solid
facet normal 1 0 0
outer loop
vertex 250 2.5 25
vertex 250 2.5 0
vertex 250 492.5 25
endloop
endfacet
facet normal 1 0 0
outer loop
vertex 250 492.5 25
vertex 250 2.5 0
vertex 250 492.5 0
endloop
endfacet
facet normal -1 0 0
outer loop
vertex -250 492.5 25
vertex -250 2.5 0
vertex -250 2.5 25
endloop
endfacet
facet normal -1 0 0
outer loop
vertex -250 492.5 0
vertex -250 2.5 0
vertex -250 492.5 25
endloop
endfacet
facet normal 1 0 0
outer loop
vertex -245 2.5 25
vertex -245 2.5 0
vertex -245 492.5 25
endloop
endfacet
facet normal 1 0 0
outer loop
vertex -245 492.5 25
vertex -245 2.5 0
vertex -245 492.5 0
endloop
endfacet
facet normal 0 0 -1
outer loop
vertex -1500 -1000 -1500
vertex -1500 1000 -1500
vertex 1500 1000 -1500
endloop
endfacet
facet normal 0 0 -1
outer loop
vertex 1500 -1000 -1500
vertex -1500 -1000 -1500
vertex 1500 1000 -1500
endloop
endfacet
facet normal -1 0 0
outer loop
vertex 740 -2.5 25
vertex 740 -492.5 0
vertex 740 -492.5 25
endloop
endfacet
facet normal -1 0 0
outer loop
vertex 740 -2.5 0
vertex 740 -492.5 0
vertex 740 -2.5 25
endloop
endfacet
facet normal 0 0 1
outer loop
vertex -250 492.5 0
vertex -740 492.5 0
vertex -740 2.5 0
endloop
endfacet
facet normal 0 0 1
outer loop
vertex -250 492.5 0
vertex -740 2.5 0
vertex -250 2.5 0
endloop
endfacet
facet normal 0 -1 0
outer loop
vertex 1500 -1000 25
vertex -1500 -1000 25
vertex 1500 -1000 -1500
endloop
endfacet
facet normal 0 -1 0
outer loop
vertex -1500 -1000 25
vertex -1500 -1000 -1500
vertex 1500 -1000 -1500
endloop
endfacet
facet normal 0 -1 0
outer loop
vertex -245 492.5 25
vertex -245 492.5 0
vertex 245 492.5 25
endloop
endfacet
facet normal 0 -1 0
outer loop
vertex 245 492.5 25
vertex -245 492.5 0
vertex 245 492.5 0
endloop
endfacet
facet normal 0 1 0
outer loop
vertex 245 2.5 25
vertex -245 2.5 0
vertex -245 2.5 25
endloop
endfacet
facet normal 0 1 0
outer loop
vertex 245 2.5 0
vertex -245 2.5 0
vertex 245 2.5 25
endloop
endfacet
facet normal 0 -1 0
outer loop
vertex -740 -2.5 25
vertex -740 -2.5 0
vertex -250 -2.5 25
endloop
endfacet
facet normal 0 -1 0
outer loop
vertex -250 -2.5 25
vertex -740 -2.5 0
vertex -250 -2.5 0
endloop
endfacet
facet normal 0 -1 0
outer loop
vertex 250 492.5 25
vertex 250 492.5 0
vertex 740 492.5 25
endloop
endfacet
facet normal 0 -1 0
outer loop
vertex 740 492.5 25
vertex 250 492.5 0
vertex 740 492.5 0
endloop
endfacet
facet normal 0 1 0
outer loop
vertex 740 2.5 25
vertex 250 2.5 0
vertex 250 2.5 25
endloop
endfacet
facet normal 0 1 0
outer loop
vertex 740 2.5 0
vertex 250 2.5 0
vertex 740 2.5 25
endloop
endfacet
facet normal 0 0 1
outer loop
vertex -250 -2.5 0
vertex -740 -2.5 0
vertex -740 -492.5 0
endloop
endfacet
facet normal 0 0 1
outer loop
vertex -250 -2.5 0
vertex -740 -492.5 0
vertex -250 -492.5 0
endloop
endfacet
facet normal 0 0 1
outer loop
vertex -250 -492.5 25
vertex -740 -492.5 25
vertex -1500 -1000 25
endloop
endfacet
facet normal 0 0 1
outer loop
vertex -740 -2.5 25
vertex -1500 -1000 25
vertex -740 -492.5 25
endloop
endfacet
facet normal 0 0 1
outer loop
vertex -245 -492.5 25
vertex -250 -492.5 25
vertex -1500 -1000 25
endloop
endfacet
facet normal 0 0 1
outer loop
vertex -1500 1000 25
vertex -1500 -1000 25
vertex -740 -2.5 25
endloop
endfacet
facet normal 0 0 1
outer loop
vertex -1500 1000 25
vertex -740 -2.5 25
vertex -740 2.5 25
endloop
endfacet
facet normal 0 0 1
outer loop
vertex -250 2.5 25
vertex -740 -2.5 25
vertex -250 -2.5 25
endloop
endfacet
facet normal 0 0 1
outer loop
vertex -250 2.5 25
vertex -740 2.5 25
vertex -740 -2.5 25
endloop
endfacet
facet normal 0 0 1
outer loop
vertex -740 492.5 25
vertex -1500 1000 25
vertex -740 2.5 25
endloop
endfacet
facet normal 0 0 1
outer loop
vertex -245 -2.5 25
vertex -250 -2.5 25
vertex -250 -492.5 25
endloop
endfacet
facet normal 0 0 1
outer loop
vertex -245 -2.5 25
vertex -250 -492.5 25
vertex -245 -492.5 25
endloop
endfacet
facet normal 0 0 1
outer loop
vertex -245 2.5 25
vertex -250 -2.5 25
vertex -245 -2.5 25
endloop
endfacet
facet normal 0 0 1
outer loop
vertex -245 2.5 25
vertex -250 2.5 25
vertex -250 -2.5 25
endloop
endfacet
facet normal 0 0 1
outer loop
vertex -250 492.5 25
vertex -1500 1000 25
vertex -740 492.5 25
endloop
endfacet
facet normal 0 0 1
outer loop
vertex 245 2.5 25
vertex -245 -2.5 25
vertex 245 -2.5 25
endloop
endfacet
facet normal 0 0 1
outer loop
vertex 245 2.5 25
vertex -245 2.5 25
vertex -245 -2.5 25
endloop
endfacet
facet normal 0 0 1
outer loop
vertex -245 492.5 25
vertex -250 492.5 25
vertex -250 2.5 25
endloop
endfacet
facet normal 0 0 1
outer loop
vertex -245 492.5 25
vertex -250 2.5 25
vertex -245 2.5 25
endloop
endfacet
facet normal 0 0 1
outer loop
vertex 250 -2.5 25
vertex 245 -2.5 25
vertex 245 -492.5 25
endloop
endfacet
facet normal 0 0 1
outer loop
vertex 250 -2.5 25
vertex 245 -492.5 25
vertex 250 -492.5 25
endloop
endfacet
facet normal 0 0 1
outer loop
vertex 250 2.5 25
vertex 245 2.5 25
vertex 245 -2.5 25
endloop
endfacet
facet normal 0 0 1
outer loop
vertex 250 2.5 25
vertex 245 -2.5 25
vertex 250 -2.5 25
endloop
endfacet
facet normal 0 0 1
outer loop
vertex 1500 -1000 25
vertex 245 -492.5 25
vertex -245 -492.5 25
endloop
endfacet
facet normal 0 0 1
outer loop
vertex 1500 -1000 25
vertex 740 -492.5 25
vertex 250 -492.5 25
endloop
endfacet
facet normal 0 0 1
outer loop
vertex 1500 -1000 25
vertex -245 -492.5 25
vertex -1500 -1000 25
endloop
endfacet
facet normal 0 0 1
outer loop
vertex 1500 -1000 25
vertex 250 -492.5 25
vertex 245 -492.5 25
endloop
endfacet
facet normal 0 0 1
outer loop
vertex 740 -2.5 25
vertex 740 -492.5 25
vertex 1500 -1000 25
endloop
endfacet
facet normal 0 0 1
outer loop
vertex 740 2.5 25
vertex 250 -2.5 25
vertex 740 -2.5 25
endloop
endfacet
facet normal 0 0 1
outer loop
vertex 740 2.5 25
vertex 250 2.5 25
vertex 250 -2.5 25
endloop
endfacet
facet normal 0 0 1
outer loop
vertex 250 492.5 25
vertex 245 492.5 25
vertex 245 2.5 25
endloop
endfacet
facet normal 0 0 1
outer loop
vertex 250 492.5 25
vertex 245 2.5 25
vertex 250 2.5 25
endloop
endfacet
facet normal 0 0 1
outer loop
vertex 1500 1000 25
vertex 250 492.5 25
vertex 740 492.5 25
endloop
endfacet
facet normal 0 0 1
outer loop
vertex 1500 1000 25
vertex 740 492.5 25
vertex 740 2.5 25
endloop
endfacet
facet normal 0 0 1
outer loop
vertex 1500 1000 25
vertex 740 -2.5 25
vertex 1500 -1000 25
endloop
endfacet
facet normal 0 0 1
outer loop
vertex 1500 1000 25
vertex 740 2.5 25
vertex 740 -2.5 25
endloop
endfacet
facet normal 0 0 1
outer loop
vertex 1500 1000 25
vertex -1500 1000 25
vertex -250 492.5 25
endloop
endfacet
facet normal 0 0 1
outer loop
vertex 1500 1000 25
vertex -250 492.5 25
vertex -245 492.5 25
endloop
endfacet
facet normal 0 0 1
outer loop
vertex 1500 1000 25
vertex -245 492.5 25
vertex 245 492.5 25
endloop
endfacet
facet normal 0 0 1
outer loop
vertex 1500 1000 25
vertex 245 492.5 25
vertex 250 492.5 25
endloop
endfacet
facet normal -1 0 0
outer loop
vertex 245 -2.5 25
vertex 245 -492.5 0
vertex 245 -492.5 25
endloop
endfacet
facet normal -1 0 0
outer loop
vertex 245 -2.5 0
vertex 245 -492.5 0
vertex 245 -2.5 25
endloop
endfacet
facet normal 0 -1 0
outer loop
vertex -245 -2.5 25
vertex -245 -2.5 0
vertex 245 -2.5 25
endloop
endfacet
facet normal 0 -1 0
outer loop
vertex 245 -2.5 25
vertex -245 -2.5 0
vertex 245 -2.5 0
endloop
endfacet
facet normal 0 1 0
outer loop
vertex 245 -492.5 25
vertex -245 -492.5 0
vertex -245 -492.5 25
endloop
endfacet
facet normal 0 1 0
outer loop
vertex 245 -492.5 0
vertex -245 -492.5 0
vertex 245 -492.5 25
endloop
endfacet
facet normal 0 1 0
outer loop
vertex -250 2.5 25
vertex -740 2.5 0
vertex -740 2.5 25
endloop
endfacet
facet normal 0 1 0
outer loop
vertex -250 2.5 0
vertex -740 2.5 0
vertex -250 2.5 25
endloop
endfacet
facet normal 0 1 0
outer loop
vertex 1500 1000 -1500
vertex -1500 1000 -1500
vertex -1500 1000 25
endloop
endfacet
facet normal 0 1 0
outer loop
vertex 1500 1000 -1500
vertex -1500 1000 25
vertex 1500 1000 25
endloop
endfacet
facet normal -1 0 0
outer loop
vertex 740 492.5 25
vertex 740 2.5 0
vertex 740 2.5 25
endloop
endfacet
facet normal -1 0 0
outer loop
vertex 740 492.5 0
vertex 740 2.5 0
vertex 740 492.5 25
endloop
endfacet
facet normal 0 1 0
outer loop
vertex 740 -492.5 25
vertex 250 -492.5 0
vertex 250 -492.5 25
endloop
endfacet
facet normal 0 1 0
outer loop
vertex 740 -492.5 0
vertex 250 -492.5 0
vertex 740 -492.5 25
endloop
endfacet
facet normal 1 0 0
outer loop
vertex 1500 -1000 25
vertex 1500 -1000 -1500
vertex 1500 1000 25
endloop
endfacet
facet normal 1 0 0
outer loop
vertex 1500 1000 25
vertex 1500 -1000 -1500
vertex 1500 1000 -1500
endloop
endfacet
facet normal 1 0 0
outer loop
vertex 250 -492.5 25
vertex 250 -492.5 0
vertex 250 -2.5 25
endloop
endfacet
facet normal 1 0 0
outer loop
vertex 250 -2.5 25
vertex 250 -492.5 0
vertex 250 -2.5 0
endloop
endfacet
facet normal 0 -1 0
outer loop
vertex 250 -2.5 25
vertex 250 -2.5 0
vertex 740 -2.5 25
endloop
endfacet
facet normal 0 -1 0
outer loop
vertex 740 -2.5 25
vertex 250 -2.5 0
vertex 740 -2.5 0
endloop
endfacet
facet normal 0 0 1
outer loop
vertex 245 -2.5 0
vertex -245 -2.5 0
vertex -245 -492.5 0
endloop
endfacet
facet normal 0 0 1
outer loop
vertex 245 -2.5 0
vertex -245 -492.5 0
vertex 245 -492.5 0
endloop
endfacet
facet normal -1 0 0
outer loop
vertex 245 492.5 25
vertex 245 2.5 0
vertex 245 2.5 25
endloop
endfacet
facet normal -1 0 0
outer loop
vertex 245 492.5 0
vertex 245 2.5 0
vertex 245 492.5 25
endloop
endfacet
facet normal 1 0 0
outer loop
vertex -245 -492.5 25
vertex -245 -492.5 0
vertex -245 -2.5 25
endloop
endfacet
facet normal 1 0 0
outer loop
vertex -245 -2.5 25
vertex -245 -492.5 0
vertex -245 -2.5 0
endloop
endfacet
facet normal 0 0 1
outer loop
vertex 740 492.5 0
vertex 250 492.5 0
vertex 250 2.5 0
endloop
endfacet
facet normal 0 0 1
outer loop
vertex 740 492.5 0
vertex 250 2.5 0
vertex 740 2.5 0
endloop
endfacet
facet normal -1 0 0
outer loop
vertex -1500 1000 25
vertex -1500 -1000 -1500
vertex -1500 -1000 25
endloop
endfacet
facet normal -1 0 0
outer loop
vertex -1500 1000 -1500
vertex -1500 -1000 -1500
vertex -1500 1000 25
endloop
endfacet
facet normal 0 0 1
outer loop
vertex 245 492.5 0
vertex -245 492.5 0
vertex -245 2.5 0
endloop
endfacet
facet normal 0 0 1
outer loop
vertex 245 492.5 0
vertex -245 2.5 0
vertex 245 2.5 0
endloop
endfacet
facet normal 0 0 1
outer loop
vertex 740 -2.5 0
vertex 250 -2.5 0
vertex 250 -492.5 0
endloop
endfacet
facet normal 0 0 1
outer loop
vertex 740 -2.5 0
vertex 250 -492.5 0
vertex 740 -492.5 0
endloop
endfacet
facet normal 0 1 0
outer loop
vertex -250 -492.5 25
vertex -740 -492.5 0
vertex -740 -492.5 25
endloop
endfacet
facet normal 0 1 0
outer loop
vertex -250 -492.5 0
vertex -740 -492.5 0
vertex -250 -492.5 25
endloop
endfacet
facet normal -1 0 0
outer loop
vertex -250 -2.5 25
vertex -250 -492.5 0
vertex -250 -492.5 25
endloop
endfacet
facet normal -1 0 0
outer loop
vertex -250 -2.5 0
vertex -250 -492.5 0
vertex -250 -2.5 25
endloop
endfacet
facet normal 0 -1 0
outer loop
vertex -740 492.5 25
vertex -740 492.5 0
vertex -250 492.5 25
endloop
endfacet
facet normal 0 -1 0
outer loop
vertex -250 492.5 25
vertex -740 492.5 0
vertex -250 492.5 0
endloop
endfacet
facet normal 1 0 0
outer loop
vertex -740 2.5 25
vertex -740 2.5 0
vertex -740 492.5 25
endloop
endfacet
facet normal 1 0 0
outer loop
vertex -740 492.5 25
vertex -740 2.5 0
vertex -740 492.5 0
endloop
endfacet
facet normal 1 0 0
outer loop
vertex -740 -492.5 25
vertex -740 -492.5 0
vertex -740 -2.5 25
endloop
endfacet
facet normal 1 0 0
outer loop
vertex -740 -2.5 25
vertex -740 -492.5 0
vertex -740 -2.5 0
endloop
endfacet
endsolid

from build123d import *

# Parameters (mm, degrees)
F0_W     = 3000
F0_H     = 2000
F1_DEPTH = 1500
F2_W     = 3000
F2_H     = 2000
F2_W_2   = 490
F2_H_2   = 490
F3_DEPTH = 25


with BuildPart() as f1:
    # F0 (on Top) → F1 (new body)
    with BuildSketch(Plane.XY):
        Rectangle(F0_W, F0_H)
    extrude(amount=-F1_DEPTH)

    # F2 (on face) → F3 (join)
    with BuildSketch(Plane.XY):
        Rectangle(F2_W, F2_H)
        with Locations((-495, -247.5)):
            Rectangle(F2_W_2, F2_H_2, mode=Mode.SUBTRACT)
        with Locations((0, -247.5)):
            Rectangle(F2_W_2, F2_H_2, mode=Mode.SUBTRACT)
        with Locations((495, -247.5)):
            Rectangle(F2_W_2, F2_H_2, mode=Mode.SUBTRACT)
        with Locations((-495, 247.5)):
            Rectangle(F2_W_2, F2_H_2, mode=Mode.SUBTRACT)
        with Locations((0, 247.5)):
            Rectangle(F2_W_2, F2_H_2, mode=Mode.SUBTRACT)
        with Locations((495, 247.5)):
            Rectangle(F2_W_2, F2_H_2, mode=Mode.SUBTRACT)
    extrude(amount=F3_DEPTH)


solid = f1.part
